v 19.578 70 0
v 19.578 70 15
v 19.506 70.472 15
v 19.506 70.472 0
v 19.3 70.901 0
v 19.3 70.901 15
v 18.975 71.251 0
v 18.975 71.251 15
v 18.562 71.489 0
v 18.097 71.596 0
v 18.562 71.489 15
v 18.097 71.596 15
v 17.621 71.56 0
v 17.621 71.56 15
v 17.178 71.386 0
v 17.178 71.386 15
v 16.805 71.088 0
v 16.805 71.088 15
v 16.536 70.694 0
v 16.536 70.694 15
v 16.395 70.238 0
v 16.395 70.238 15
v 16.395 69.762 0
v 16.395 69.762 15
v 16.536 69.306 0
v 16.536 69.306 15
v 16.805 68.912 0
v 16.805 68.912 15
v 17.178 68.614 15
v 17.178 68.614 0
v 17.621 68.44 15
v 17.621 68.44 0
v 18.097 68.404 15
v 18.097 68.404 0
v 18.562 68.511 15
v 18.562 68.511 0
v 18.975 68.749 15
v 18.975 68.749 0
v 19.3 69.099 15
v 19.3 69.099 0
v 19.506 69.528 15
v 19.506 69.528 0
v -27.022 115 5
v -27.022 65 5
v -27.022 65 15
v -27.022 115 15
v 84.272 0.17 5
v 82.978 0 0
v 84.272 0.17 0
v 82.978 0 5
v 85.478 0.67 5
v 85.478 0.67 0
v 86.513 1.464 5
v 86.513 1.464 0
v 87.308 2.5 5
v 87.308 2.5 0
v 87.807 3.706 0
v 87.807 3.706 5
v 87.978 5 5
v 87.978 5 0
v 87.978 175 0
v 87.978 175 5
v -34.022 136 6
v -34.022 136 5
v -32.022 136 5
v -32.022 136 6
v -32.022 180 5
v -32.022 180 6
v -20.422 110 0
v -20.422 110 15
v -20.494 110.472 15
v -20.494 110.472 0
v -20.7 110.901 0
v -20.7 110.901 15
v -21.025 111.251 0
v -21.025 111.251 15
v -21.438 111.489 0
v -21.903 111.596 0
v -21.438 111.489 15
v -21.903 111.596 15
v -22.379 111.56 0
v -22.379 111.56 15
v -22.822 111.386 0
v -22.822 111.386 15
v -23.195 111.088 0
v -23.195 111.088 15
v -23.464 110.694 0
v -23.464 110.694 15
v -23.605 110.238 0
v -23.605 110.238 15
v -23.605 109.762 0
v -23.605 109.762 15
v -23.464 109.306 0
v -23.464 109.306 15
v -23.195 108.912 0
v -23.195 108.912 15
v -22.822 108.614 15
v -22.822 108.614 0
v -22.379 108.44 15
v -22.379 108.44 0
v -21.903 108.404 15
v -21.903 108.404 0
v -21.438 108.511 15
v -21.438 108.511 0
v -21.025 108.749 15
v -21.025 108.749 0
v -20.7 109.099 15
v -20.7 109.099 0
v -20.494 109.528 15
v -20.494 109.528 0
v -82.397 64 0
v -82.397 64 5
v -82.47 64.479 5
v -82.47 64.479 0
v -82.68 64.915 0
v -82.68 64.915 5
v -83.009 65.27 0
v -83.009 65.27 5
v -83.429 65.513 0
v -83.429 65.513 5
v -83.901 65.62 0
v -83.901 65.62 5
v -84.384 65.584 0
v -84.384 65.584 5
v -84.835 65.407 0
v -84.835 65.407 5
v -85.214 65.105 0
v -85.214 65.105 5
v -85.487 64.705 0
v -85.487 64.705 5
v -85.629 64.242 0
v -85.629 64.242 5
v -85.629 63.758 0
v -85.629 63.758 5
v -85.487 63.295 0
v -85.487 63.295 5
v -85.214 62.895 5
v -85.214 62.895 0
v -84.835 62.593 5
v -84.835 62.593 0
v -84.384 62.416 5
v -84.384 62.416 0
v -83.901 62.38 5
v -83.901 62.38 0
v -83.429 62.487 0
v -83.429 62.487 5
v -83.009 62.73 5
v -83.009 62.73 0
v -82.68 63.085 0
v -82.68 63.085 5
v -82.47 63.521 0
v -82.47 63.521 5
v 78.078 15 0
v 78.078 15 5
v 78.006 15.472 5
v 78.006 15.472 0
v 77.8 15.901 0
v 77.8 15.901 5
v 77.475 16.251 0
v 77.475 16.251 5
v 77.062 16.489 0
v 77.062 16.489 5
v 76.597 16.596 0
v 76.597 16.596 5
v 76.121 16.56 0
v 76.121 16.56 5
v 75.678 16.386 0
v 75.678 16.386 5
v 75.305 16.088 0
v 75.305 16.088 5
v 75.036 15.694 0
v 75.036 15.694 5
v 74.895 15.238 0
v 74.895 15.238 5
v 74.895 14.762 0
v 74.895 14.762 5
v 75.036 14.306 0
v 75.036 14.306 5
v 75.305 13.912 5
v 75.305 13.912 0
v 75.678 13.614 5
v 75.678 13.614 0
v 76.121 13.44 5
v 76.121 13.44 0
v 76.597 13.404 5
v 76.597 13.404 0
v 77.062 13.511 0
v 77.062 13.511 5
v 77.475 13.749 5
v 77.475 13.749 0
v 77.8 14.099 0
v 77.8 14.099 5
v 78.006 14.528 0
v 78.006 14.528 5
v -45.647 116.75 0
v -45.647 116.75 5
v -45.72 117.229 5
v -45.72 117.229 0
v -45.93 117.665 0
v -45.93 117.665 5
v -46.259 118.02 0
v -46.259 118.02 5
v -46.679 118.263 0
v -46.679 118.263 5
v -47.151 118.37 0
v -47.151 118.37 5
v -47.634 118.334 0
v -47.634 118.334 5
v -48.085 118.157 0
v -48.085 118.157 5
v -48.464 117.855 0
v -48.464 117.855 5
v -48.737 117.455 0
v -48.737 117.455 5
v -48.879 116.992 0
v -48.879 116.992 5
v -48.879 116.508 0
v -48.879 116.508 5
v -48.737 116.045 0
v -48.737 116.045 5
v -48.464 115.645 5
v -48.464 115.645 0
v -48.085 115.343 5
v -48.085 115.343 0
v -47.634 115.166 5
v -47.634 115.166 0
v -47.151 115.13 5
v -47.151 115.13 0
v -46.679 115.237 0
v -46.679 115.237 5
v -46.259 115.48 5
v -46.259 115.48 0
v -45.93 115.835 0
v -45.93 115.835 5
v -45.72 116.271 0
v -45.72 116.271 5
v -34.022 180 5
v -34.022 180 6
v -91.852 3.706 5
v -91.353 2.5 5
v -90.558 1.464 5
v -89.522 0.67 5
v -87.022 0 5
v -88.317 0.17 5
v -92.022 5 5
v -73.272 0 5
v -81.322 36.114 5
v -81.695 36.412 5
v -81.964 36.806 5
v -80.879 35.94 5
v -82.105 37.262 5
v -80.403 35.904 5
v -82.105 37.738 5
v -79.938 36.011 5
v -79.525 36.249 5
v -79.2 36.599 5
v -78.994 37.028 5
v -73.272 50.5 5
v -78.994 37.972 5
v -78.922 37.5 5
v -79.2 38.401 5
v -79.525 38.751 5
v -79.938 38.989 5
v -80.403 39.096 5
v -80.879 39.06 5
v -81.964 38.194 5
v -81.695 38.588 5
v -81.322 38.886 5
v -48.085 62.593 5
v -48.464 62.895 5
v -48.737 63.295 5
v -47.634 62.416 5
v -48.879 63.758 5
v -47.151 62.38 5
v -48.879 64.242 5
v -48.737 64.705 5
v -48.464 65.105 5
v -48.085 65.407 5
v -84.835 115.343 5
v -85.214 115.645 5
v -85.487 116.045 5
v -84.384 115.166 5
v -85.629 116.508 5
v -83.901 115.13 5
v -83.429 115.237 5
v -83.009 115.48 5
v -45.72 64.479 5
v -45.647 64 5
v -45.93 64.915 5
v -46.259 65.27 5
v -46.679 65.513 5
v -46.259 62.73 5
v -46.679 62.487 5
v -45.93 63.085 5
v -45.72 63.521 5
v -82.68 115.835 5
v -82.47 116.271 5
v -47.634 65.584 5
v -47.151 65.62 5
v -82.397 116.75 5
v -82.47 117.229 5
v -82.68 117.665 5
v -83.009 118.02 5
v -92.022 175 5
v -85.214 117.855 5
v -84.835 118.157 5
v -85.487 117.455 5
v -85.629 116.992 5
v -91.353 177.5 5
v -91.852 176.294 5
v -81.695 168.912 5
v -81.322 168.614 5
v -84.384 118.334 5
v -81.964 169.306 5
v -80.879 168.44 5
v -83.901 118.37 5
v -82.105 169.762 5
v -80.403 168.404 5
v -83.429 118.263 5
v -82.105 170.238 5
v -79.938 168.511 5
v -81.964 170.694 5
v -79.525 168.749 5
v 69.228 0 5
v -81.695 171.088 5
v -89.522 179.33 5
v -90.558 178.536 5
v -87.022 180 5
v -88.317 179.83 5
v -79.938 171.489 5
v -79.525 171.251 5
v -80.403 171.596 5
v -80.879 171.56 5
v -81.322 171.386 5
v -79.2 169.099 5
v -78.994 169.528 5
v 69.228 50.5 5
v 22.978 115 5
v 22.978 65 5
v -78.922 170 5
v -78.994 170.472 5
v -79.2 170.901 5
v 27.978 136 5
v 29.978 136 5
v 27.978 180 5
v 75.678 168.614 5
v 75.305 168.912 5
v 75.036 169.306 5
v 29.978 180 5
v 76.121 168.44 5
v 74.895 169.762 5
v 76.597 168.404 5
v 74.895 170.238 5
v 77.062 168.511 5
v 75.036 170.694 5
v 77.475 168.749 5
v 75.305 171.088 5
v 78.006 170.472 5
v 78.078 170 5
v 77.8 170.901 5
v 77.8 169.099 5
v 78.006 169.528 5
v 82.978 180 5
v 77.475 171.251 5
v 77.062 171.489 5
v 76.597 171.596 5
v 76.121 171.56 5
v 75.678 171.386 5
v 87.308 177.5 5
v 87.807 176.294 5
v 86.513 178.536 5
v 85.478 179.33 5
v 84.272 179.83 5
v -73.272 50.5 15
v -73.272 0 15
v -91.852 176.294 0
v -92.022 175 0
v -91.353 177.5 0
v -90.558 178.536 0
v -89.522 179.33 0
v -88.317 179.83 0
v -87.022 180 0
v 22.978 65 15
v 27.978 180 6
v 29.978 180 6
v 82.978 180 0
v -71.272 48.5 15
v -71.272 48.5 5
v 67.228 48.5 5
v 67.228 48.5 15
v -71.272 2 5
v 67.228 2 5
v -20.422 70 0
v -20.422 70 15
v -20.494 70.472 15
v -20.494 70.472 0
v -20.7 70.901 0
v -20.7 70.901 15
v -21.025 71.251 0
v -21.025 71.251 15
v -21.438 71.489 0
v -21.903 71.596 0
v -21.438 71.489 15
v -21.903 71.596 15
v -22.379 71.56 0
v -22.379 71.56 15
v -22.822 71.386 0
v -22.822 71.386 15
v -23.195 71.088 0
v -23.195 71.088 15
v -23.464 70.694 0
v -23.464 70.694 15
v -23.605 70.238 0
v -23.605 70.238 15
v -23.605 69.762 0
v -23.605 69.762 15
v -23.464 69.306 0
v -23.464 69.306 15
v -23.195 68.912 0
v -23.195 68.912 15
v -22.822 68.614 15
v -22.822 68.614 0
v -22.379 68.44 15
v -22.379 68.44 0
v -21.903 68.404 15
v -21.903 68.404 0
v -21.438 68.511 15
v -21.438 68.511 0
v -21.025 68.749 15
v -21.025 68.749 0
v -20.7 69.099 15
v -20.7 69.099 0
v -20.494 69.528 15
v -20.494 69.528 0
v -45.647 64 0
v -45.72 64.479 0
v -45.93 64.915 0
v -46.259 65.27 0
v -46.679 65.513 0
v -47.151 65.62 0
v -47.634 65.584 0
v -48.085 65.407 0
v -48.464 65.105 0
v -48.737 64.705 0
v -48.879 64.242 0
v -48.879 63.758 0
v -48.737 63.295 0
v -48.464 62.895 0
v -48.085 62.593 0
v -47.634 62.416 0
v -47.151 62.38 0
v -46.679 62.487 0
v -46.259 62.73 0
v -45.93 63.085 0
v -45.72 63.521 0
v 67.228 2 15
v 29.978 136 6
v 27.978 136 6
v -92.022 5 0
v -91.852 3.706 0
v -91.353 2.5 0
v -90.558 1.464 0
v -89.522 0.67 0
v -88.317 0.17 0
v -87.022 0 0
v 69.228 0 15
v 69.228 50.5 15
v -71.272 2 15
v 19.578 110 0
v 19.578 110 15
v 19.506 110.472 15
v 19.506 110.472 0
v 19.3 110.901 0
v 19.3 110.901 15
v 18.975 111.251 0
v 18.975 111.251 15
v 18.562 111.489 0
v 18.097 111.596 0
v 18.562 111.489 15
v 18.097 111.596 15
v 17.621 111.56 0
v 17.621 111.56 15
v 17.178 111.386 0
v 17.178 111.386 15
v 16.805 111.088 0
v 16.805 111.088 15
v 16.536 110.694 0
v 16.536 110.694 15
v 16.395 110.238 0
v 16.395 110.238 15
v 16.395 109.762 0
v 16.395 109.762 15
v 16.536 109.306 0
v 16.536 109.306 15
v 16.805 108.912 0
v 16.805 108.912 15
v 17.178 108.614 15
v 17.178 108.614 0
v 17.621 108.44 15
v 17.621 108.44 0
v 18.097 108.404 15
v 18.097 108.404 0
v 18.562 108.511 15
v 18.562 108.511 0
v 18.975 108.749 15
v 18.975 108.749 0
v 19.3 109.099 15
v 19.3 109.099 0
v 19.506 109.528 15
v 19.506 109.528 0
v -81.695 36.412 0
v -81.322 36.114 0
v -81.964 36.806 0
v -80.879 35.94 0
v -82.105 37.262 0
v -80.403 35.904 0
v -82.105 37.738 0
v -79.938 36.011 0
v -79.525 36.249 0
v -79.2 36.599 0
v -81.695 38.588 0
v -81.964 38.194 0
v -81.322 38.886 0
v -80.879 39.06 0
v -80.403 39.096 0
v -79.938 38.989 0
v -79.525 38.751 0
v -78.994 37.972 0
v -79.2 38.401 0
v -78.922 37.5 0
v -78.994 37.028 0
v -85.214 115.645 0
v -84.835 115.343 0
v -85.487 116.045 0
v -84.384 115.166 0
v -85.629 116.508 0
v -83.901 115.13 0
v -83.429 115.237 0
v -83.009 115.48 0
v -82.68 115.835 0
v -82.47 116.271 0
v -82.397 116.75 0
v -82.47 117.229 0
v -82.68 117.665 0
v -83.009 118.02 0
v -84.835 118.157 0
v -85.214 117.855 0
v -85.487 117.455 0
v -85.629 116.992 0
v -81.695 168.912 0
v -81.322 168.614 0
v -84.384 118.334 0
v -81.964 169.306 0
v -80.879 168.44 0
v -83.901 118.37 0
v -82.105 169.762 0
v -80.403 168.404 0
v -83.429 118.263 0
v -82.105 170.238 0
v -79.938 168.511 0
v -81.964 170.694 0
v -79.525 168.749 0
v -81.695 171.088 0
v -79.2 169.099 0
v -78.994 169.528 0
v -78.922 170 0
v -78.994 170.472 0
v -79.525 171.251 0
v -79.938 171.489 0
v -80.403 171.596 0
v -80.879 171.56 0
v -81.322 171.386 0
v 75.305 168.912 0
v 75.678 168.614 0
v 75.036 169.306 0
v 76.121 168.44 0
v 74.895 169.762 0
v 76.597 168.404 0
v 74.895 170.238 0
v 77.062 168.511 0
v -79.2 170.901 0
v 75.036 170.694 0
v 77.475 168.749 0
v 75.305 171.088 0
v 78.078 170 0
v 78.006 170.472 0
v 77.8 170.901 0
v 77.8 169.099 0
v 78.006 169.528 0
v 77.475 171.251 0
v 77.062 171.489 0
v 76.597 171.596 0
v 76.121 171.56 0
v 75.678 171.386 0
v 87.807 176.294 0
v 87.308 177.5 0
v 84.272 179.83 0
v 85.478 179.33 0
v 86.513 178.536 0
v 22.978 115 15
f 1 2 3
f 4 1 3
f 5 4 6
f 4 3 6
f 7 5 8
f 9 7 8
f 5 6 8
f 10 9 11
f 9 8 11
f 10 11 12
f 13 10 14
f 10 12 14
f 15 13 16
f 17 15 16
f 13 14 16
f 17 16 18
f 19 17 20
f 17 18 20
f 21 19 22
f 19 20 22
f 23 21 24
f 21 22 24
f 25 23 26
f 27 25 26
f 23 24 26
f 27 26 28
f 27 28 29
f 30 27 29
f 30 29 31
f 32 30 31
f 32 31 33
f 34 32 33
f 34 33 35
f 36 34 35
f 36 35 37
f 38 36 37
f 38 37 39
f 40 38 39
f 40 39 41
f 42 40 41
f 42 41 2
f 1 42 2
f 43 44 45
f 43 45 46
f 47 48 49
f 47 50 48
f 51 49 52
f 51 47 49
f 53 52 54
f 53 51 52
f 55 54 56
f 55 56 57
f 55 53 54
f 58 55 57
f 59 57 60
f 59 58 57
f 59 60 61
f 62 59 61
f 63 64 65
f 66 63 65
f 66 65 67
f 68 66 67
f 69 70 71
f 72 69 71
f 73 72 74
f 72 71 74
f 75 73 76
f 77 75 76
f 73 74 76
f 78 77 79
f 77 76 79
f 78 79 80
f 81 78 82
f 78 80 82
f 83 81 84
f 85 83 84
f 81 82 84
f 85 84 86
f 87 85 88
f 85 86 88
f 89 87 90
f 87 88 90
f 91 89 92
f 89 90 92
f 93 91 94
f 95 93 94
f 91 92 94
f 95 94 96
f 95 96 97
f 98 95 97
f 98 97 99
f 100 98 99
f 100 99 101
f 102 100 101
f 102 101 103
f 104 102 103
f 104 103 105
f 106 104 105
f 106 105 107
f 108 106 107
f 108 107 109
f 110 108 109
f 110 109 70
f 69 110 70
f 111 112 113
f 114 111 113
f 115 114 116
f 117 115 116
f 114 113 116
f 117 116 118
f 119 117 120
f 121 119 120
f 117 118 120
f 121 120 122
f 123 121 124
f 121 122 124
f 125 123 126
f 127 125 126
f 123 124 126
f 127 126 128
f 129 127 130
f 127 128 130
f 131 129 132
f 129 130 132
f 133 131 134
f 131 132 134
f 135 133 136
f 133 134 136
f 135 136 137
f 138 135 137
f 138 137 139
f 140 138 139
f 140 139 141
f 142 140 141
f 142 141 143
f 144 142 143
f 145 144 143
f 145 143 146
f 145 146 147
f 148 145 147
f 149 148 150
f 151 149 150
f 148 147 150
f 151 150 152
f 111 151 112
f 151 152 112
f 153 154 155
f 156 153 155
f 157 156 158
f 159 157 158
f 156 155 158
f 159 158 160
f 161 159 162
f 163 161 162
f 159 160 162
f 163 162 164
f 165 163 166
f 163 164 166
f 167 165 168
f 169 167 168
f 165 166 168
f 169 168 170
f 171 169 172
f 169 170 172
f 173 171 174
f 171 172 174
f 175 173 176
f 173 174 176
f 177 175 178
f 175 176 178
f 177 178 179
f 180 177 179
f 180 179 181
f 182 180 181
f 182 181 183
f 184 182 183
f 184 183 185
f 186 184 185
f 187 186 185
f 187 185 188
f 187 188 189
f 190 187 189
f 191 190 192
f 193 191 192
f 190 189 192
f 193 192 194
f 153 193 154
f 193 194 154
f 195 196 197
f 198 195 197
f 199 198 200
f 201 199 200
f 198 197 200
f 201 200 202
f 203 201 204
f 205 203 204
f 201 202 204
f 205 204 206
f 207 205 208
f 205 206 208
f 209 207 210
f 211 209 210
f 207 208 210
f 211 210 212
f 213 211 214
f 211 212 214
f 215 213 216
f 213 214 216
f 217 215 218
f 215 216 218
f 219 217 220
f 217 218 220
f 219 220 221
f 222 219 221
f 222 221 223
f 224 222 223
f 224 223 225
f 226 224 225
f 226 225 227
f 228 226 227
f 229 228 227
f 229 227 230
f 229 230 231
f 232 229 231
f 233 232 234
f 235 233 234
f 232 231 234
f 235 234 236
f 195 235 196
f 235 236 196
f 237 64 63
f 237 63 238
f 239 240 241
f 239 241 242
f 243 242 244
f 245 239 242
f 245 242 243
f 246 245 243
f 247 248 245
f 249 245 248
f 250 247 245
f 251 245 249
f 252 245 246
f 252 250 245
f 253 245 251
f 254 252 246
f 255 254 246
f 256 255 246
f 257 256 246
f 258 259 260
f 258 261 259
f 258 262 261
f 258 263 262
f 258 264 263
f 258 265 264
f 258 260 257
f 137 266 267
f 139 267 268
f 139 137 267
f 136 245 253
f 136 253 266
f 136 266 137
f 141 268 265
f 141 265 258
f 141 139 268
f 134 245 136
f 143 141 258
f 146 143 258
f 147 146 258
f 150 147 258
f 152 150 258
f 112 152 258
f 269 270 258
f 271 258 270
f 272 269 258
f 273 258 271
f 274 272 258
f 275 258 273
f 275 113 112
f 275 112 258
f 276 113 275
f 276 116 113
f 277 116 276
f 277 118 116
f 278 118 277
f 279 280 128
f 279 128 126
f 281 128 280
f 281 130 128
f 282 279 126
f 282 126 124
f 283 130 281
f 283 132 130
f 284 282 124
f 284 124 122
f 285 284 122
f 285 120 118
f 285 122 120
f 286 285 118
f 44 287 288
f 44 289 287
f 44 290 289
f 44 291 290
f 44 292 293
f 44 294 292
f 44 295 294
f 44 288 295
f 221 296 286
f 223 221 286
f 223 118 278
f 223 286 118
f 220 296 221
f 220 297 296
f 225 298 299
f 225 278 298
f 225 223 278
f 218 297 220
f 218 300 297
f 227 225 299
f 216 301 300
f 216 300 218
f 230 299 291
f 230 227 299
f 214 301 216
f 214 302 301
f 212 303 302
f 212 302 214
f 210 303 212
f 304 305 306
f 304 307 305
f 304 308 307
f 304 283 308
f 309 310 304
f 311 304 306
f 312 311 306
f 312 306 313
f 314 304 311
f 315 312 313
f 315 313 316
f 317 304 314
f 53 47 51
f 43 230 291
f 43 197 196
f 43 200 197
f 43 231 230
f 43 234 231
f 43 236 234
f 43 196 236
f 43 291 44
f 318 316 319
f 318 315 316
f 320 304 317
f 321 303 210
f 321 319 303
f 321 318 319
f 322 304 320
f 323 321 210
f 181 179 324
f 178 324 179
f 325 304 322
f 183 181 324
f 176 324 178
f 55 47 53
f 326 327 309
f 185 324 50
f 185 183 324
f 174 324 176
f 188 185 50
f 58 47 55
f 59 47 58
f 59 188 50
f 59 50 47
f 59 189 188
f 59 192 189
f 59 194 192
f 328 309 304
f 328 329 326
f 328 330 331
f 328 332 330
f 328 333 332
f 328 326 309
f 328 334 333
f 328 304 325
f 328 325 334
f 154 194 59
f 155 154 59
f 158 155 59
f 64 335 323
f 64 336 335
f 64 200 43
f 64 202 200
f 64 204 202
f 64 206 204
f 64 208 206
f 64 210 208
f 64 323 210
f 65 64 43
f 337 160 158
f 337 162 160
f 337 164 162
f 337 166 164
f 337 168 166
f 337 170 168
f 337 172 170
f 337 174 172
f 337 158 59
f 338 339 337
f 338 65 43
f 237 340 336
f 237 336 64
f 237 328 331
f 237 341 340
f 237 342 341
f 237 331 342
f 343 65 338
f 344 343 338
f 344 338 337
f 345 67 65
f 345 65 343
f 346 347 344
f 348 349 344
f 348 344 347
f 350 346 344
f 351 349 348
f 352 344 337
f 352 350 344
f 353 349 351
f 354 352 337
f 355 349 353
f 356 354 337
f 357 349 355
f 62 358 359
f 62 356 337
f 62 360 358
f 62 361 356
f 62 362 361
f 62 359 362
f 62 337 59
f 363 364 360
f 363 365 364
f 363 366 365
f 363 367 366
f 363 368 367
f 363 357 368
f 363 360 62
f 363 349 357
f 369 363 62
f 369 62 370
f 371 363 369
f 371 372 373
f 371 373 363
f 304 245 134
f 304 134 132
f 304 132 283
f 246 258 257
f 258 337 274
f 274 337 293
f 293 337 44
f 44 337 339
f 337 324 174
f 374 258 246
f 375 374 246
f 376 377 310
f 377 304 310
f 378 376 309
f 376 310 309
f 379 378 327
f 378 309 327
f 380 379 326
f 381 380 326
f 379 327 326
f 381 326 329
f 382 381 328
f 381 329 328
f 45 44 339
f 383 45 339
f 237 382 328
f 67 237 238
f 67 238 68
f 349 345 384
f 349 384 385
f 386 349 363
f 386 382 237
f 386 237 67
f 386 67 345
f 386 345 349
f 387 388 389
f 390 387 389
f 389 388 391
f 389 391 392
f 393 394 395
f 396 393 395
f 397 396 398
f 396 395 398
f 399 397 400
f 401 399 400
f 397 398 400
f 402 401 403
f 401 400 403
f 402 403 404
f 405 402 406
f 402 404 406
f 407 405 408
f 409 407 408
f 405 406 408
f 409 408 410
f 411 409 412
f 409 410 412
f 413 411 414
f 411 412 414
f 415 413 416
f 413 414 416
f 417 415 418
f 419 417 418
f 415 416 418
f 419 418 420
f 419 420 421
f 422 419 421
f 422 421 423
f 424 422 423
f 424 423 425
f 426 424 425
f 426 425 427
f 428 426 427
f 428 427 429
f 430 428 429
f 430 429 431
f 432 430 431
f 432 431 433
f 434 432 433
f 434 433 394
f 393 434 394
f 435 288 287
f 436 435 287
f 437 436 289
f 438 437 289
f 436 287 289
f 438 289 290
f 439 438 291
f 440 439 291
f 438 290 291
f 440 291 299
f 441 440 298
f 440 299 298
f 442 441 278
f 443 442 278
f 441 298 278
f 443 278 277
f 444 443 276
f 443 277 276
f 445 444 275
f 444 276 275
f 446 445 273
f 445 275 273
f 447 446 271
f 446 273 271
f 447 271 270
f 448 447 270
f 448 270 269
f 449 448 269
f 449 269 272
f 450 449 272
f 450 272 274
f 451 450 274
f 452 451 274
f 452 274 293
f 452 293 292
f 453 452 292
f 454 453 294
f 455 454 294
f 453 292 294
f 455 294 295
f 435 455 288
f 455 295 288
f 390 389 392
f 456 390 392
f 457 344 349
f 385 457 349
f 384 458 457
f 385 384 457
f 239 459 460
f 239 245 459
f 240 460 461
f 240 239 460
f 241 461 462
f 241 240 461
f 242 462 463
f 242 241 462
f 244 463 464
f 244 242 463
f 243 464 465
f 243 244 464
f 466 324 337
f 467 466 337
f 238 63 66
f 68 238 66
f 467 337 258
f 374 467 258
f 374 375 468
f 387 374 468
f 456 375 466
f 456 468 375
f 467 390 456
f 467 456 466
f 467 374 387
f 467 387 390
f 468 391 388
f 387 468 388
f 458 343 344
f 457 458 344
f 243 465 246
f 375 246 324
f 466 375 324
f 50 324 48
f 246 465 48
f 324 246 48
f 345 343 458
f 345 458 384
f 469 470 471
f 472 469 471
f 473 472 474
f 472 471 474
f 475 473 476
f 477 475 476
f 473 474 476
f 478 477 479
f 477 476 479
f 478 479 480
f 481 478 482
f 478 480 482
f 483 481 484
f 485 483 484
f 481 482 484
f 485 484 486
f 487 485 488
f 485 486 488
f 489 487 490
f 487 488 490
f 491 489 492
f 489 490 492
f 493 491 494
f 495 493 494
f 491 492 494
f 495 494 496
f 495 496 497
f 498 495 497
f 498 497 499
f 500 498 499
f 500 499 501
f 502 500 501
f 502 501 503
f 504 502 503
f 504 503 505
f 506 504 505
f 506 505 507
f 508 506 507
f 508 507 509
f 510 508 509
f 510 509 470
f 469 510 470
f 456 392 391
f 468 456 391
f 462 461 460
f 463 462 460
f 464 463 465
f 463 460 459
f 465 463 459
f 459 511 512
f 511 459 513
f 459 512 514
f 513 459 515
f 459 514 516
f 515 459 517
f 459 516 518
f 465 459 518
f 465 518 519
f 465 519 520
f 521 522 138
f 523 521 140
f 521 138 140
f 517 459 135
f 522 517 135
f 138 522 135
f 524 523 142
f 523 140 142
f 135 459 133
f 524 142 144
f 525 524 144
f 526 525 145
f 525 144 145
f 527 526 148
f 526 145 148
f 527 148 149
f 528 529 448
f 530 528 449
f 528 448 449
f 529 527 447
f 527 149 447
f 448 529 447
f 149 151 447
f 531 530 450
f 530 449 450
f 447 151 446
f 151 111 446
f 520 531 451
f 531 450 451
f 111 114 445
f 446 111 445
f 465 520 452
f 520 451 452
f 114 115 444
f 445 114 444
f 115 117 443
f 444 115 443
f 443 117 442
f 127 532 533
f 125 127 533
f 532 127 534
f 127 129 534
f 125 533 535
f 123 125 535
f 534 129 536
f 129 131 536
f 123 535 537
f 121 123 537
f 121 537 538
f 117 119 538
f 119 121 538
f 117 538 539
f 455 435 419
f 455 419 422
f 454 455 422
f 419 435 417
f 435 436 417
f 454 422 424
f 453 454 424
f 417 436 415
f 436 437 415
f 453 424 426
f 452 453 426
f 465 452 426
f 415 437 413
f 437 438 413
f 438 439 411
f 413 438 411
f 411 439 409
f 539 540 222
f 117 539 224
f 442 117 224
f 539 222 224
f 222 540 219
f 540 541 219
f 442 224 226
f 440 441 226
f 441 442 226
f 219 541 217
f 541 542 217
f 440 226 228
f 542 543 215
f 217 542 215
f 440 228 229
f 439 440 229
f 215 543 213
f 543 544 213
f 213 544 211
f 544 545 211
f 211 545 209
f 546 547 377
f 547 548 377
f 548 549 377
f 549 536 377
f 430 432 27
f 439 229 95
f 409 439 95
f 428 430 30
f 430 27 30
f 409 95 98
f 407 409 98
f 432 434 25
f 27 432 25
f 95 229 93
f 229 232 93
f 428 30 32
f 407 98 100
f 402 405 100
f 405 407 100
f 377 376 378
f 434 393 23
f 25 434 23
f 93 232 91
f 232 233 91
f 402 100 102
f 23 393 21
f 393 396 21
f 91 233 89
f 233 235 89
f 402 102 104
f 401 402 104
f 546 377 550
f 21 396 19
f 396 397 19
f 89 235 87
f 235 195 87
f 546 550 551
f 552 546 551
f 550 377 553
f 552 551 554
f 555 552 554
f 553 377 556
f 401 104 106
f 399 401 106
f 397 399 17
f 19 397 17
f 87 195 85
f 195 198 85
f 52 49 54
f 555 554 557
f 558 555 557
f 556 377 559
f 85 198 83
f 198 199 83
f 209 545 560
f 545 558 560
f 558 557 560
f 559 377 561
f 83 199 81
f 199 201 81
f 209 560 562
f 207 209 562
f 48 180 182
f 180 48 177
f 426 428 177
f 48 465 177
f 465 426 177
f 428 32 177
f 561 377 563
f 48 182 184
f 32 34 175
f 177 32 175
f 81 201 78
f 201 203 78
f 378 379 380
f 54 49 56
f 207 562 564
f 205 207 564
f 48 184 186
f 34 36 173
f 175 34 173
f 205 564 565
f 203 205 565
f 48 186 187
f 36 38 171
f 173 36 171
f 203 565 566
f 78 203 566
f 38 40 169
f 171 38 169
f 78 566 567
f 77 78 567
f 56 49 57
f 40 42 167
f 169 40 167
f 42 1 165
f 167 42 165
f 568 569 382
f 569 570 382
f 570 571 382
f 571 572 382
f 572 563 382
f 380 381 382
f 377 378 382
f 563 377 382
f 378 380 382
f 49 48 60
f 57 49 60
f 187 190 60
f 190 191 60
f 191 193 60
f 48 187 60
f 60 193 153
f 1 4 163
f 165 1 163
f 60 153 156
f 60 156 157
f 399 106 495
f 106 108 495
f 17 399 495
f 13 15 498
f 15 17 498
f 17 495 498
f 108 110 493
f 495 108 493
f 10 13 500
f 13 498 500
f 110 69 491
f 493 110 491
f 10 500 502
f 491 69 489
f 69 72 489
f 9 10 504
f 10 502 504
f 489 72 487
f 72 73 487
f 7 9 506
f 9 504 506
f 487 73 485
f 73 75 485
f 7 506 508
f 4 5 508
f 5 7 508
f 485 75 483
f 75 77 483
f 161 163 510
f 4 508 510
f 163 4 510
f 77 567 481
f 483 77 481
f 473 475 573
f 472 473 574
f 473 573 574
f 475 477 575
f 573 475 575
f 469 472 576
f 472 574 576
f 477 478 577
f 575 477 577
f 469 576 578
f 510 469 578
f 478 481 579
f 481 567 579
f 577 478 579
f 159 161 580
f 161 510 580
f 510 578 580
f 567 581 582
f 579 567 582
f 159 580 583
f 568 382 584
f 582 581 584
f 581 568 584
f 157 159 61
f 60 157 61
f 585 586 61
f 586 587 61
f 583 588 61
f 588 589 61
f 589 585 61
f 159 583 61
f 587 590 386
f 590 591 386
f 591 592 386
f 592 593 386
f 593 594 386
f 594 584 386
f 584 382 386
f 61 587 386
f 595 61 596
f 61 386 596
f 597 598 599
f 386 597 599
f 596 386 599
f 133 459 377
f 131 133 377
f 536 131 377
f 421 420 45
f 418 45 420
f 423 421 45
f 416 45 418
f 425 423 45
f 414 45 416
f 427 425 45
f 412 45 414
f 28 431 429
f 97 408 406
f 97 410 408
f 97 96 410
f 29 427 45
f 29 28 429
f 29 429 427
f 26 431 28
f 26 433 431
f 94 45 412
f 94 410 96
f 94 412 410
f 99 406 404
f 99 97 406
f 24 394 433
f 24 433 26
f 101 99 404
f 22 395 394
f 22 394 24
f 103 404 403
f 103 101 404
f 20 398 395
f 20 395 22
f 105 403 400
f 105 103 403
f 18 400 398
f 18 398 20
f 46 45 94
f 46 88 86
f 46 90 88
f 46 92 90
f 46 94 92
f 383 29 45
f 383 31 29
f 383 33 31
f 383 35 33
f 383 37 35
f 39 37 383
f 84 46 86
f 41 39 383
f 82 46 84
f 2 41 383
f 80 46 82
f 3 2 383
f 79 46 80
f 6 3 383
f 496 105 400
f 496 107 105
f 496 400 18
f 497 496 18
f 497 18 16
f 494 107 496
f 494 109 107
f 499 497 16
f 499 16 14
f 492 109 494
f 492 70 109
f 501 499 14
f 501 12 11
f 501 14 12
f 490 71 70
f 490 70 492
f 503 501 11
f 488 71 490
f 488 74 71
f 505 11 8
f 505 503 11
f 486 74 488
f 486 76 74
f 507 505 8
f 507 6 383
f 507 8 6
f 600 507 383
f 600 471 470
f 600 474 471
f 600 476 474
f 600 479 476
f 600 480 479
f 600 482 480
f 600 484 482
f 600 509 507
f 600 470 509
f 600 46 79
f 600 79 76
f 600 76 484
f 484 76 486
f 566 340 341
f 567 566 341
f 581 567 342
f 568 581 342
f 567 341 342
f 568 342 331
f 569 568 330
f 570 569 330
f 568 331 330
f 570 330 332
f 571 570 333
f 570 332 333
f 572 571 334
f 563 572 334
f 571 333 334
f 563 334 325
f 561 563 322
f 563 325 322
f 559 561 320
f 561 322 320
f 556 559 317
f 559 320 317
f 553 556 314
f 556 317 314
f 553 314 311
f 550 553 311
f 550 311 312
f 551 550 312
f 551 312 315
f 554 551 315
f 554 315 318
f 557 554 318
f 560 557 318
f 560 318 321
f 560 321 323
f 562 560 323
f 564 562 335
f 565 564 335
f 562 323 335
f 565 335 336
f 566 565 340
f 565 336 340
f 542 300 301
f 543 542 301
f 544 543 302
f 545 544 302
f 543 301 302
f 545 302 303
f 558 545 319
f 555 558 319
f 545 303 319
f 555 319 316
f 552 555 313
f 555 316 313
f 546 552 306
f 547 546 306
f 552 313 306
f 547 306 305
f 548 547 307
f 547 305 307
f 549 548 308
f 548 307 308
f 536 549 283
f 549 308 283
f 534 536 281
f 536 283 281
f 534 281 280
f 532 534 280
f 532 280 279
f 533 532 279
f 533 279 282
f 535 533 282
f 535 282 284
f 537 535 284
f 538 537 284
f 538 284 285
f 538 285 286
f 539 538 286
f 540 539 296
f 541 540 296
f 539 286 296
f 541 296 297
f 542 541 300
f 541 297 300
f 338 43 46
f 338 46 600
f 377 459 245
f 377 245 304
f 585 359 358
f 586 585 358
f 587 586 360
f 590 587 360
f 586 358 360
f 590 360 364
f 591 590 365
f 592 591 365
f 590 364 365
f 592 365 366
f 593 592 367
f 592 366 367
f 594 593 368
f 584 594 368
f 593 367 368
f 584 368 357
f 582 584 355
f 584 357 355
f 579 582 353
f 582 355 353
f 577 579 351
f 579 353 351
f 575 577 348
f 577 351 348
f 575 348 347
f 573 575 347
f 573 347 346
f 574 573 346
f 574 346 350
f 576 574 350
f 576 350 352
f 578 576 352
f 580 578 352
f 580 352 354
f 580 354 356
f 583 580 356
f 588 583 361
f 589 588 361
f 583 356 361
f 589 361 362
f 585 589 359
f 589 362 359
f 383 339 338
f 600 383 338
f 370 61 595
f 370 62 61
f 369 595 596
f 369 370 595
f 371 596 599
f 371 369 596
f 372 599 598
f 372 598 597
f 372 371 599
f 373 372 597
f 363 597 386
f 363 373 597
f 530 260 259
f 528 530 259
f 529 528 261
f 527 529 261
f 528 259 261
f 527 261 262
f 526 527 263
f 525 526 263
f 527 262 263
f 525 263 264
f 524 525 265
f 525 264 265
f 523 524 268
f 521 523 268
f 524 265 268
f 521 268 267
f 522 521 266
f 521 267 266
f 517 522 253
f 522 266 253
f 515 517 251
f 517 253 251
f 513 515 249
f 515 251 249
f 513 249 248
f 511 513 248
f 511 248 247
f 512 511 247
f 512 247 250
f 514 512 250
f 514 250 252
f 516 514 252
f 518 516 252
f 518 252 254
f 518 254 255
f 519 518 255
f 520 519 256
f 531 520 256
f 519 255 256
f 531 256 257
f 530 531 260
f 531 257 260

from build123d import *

# Parameters (mm, degrees)
F0_W      = 180
F0_H      = 180
F1_DEPTH  = 5
F2_R      = 5
F3_R      = 1.6
F4_DEPTH  = 5
F5_R      = 1.625
F6_DEPTH  = 5
F7_W      = 50
F7_H      = 50
F8_DEPTH  = 10
F11_DEPTH = 10
F9_R      = 1.6
F12_DEPTH = 25
F13_W     = 2
F13_H     = 44
F14_DEPTH = 1


with BuildPart() as f1:
    # F0 (on Top) → F1 (new body)
    with BuildSketch(Plane.XY):
        with Locations((-2.0224731235, 90)):
            Rectangle(F0_W, F0_H)
    extrude(amount=F1_DEPTH)

    # F2
    f2_edges = [f1.edges().sort_by_distance(p)[0] for p in [
        (87.977527, 0, 2.5),
        (-92.022473, 180, 2.5),
        (-92.022473, 0, 2.5),
        (87.977527, 180, 2.5),
    ]]
    fillet(f2_edges, radius=F2_R)

    # F3 (on face) → F4 (cut)
    with BuildSketch(Plane.XY.offset(5)):
        with Locations((-80.5224731235, 170)):
            Circle(F3_R)
        with Locations((76.4775268765, 170)):
            Circle(F3_R)
        with Locations((76.4775268765, 15)):
            Circle(F3_R)
        with Locations((-80.5224731235, 37.5)):
            Circle(F3_R)
    extrude(amount=-F4_DEPTH, mode=Mode.SUBTRACT)

    # F5 (on face) → F6 (cut)
    with BuildSketch(Plane.XY.offset(5)):
        with Locations((-84.0224731235, 64)):
            Circle(F5_R)
        with Locations((-84.0224731235, 116.75)):
            Circle(F5_R)
        with Locations((-47.2724731235, 64)):
            Circle(F5_R)
        with Locations((-47.2724731235, 116.75)):
            Circle(F5_R)
    extrude(amount=-F6_DEPTH, mode=Mode.SUBTRACT)

    # F7 (on face) → F8 (join)
    with BuildSketch(Plane.XY.offset(5)):
        with Locations((-2.0224731235, 90)):
            Rectangle(F7_W, F7_H)
    extrude(amount=F8_DEPTH)

    # F10 (on face) → F11 (join)
    with BuildSketch(Plane.XY.offset(5)):
        Polygon((69.2275268765, 50.5), (-2.0224731235, 50.5), (-73.2724731235, 50.5), (-73.2724731235, 0), (69.2275268765, 0), align=None)
        Polygon((-71.2724731235, 48.5), (-2.0224731235, 48.5), (67.2275268765, 48.5), (67.2275268765, 2), (-71.2724731235, 2), align=None, mode=Mode.SUBTRACT)
    extrude(amount=F11_DEPTH)

    # F9 (on face) → F12 (cut)
    with BuildSketch(Plane.XY.offset(15)):
        with Locations((-22.0224731235, 70)):
            Circle(F9_R)
        with Locations((17.9775268765, 70)):
            Circle(F9_R)
        with Locations((17.9775268765, 110)):
            Circle(F9_R)
        with Locations((-22.0224731235, 110)):
            Circle(F9_R)
    extrude(amount=-F12_DEPTH, mode=Mode.SUBTRACT)

    # F13 (on face) → F14 (join)
    with BuildSketch(Plane.XY.offset(5)):
        with Locations((-33.0224731235, 158)):
            Rectangle(F13_W, F13_H)
        with Locations((28.9775268765, 158)):
            Rectangle(F13_W, F13_H)
    extrude(amount=F14_DEPTH)


solid = f1.part
